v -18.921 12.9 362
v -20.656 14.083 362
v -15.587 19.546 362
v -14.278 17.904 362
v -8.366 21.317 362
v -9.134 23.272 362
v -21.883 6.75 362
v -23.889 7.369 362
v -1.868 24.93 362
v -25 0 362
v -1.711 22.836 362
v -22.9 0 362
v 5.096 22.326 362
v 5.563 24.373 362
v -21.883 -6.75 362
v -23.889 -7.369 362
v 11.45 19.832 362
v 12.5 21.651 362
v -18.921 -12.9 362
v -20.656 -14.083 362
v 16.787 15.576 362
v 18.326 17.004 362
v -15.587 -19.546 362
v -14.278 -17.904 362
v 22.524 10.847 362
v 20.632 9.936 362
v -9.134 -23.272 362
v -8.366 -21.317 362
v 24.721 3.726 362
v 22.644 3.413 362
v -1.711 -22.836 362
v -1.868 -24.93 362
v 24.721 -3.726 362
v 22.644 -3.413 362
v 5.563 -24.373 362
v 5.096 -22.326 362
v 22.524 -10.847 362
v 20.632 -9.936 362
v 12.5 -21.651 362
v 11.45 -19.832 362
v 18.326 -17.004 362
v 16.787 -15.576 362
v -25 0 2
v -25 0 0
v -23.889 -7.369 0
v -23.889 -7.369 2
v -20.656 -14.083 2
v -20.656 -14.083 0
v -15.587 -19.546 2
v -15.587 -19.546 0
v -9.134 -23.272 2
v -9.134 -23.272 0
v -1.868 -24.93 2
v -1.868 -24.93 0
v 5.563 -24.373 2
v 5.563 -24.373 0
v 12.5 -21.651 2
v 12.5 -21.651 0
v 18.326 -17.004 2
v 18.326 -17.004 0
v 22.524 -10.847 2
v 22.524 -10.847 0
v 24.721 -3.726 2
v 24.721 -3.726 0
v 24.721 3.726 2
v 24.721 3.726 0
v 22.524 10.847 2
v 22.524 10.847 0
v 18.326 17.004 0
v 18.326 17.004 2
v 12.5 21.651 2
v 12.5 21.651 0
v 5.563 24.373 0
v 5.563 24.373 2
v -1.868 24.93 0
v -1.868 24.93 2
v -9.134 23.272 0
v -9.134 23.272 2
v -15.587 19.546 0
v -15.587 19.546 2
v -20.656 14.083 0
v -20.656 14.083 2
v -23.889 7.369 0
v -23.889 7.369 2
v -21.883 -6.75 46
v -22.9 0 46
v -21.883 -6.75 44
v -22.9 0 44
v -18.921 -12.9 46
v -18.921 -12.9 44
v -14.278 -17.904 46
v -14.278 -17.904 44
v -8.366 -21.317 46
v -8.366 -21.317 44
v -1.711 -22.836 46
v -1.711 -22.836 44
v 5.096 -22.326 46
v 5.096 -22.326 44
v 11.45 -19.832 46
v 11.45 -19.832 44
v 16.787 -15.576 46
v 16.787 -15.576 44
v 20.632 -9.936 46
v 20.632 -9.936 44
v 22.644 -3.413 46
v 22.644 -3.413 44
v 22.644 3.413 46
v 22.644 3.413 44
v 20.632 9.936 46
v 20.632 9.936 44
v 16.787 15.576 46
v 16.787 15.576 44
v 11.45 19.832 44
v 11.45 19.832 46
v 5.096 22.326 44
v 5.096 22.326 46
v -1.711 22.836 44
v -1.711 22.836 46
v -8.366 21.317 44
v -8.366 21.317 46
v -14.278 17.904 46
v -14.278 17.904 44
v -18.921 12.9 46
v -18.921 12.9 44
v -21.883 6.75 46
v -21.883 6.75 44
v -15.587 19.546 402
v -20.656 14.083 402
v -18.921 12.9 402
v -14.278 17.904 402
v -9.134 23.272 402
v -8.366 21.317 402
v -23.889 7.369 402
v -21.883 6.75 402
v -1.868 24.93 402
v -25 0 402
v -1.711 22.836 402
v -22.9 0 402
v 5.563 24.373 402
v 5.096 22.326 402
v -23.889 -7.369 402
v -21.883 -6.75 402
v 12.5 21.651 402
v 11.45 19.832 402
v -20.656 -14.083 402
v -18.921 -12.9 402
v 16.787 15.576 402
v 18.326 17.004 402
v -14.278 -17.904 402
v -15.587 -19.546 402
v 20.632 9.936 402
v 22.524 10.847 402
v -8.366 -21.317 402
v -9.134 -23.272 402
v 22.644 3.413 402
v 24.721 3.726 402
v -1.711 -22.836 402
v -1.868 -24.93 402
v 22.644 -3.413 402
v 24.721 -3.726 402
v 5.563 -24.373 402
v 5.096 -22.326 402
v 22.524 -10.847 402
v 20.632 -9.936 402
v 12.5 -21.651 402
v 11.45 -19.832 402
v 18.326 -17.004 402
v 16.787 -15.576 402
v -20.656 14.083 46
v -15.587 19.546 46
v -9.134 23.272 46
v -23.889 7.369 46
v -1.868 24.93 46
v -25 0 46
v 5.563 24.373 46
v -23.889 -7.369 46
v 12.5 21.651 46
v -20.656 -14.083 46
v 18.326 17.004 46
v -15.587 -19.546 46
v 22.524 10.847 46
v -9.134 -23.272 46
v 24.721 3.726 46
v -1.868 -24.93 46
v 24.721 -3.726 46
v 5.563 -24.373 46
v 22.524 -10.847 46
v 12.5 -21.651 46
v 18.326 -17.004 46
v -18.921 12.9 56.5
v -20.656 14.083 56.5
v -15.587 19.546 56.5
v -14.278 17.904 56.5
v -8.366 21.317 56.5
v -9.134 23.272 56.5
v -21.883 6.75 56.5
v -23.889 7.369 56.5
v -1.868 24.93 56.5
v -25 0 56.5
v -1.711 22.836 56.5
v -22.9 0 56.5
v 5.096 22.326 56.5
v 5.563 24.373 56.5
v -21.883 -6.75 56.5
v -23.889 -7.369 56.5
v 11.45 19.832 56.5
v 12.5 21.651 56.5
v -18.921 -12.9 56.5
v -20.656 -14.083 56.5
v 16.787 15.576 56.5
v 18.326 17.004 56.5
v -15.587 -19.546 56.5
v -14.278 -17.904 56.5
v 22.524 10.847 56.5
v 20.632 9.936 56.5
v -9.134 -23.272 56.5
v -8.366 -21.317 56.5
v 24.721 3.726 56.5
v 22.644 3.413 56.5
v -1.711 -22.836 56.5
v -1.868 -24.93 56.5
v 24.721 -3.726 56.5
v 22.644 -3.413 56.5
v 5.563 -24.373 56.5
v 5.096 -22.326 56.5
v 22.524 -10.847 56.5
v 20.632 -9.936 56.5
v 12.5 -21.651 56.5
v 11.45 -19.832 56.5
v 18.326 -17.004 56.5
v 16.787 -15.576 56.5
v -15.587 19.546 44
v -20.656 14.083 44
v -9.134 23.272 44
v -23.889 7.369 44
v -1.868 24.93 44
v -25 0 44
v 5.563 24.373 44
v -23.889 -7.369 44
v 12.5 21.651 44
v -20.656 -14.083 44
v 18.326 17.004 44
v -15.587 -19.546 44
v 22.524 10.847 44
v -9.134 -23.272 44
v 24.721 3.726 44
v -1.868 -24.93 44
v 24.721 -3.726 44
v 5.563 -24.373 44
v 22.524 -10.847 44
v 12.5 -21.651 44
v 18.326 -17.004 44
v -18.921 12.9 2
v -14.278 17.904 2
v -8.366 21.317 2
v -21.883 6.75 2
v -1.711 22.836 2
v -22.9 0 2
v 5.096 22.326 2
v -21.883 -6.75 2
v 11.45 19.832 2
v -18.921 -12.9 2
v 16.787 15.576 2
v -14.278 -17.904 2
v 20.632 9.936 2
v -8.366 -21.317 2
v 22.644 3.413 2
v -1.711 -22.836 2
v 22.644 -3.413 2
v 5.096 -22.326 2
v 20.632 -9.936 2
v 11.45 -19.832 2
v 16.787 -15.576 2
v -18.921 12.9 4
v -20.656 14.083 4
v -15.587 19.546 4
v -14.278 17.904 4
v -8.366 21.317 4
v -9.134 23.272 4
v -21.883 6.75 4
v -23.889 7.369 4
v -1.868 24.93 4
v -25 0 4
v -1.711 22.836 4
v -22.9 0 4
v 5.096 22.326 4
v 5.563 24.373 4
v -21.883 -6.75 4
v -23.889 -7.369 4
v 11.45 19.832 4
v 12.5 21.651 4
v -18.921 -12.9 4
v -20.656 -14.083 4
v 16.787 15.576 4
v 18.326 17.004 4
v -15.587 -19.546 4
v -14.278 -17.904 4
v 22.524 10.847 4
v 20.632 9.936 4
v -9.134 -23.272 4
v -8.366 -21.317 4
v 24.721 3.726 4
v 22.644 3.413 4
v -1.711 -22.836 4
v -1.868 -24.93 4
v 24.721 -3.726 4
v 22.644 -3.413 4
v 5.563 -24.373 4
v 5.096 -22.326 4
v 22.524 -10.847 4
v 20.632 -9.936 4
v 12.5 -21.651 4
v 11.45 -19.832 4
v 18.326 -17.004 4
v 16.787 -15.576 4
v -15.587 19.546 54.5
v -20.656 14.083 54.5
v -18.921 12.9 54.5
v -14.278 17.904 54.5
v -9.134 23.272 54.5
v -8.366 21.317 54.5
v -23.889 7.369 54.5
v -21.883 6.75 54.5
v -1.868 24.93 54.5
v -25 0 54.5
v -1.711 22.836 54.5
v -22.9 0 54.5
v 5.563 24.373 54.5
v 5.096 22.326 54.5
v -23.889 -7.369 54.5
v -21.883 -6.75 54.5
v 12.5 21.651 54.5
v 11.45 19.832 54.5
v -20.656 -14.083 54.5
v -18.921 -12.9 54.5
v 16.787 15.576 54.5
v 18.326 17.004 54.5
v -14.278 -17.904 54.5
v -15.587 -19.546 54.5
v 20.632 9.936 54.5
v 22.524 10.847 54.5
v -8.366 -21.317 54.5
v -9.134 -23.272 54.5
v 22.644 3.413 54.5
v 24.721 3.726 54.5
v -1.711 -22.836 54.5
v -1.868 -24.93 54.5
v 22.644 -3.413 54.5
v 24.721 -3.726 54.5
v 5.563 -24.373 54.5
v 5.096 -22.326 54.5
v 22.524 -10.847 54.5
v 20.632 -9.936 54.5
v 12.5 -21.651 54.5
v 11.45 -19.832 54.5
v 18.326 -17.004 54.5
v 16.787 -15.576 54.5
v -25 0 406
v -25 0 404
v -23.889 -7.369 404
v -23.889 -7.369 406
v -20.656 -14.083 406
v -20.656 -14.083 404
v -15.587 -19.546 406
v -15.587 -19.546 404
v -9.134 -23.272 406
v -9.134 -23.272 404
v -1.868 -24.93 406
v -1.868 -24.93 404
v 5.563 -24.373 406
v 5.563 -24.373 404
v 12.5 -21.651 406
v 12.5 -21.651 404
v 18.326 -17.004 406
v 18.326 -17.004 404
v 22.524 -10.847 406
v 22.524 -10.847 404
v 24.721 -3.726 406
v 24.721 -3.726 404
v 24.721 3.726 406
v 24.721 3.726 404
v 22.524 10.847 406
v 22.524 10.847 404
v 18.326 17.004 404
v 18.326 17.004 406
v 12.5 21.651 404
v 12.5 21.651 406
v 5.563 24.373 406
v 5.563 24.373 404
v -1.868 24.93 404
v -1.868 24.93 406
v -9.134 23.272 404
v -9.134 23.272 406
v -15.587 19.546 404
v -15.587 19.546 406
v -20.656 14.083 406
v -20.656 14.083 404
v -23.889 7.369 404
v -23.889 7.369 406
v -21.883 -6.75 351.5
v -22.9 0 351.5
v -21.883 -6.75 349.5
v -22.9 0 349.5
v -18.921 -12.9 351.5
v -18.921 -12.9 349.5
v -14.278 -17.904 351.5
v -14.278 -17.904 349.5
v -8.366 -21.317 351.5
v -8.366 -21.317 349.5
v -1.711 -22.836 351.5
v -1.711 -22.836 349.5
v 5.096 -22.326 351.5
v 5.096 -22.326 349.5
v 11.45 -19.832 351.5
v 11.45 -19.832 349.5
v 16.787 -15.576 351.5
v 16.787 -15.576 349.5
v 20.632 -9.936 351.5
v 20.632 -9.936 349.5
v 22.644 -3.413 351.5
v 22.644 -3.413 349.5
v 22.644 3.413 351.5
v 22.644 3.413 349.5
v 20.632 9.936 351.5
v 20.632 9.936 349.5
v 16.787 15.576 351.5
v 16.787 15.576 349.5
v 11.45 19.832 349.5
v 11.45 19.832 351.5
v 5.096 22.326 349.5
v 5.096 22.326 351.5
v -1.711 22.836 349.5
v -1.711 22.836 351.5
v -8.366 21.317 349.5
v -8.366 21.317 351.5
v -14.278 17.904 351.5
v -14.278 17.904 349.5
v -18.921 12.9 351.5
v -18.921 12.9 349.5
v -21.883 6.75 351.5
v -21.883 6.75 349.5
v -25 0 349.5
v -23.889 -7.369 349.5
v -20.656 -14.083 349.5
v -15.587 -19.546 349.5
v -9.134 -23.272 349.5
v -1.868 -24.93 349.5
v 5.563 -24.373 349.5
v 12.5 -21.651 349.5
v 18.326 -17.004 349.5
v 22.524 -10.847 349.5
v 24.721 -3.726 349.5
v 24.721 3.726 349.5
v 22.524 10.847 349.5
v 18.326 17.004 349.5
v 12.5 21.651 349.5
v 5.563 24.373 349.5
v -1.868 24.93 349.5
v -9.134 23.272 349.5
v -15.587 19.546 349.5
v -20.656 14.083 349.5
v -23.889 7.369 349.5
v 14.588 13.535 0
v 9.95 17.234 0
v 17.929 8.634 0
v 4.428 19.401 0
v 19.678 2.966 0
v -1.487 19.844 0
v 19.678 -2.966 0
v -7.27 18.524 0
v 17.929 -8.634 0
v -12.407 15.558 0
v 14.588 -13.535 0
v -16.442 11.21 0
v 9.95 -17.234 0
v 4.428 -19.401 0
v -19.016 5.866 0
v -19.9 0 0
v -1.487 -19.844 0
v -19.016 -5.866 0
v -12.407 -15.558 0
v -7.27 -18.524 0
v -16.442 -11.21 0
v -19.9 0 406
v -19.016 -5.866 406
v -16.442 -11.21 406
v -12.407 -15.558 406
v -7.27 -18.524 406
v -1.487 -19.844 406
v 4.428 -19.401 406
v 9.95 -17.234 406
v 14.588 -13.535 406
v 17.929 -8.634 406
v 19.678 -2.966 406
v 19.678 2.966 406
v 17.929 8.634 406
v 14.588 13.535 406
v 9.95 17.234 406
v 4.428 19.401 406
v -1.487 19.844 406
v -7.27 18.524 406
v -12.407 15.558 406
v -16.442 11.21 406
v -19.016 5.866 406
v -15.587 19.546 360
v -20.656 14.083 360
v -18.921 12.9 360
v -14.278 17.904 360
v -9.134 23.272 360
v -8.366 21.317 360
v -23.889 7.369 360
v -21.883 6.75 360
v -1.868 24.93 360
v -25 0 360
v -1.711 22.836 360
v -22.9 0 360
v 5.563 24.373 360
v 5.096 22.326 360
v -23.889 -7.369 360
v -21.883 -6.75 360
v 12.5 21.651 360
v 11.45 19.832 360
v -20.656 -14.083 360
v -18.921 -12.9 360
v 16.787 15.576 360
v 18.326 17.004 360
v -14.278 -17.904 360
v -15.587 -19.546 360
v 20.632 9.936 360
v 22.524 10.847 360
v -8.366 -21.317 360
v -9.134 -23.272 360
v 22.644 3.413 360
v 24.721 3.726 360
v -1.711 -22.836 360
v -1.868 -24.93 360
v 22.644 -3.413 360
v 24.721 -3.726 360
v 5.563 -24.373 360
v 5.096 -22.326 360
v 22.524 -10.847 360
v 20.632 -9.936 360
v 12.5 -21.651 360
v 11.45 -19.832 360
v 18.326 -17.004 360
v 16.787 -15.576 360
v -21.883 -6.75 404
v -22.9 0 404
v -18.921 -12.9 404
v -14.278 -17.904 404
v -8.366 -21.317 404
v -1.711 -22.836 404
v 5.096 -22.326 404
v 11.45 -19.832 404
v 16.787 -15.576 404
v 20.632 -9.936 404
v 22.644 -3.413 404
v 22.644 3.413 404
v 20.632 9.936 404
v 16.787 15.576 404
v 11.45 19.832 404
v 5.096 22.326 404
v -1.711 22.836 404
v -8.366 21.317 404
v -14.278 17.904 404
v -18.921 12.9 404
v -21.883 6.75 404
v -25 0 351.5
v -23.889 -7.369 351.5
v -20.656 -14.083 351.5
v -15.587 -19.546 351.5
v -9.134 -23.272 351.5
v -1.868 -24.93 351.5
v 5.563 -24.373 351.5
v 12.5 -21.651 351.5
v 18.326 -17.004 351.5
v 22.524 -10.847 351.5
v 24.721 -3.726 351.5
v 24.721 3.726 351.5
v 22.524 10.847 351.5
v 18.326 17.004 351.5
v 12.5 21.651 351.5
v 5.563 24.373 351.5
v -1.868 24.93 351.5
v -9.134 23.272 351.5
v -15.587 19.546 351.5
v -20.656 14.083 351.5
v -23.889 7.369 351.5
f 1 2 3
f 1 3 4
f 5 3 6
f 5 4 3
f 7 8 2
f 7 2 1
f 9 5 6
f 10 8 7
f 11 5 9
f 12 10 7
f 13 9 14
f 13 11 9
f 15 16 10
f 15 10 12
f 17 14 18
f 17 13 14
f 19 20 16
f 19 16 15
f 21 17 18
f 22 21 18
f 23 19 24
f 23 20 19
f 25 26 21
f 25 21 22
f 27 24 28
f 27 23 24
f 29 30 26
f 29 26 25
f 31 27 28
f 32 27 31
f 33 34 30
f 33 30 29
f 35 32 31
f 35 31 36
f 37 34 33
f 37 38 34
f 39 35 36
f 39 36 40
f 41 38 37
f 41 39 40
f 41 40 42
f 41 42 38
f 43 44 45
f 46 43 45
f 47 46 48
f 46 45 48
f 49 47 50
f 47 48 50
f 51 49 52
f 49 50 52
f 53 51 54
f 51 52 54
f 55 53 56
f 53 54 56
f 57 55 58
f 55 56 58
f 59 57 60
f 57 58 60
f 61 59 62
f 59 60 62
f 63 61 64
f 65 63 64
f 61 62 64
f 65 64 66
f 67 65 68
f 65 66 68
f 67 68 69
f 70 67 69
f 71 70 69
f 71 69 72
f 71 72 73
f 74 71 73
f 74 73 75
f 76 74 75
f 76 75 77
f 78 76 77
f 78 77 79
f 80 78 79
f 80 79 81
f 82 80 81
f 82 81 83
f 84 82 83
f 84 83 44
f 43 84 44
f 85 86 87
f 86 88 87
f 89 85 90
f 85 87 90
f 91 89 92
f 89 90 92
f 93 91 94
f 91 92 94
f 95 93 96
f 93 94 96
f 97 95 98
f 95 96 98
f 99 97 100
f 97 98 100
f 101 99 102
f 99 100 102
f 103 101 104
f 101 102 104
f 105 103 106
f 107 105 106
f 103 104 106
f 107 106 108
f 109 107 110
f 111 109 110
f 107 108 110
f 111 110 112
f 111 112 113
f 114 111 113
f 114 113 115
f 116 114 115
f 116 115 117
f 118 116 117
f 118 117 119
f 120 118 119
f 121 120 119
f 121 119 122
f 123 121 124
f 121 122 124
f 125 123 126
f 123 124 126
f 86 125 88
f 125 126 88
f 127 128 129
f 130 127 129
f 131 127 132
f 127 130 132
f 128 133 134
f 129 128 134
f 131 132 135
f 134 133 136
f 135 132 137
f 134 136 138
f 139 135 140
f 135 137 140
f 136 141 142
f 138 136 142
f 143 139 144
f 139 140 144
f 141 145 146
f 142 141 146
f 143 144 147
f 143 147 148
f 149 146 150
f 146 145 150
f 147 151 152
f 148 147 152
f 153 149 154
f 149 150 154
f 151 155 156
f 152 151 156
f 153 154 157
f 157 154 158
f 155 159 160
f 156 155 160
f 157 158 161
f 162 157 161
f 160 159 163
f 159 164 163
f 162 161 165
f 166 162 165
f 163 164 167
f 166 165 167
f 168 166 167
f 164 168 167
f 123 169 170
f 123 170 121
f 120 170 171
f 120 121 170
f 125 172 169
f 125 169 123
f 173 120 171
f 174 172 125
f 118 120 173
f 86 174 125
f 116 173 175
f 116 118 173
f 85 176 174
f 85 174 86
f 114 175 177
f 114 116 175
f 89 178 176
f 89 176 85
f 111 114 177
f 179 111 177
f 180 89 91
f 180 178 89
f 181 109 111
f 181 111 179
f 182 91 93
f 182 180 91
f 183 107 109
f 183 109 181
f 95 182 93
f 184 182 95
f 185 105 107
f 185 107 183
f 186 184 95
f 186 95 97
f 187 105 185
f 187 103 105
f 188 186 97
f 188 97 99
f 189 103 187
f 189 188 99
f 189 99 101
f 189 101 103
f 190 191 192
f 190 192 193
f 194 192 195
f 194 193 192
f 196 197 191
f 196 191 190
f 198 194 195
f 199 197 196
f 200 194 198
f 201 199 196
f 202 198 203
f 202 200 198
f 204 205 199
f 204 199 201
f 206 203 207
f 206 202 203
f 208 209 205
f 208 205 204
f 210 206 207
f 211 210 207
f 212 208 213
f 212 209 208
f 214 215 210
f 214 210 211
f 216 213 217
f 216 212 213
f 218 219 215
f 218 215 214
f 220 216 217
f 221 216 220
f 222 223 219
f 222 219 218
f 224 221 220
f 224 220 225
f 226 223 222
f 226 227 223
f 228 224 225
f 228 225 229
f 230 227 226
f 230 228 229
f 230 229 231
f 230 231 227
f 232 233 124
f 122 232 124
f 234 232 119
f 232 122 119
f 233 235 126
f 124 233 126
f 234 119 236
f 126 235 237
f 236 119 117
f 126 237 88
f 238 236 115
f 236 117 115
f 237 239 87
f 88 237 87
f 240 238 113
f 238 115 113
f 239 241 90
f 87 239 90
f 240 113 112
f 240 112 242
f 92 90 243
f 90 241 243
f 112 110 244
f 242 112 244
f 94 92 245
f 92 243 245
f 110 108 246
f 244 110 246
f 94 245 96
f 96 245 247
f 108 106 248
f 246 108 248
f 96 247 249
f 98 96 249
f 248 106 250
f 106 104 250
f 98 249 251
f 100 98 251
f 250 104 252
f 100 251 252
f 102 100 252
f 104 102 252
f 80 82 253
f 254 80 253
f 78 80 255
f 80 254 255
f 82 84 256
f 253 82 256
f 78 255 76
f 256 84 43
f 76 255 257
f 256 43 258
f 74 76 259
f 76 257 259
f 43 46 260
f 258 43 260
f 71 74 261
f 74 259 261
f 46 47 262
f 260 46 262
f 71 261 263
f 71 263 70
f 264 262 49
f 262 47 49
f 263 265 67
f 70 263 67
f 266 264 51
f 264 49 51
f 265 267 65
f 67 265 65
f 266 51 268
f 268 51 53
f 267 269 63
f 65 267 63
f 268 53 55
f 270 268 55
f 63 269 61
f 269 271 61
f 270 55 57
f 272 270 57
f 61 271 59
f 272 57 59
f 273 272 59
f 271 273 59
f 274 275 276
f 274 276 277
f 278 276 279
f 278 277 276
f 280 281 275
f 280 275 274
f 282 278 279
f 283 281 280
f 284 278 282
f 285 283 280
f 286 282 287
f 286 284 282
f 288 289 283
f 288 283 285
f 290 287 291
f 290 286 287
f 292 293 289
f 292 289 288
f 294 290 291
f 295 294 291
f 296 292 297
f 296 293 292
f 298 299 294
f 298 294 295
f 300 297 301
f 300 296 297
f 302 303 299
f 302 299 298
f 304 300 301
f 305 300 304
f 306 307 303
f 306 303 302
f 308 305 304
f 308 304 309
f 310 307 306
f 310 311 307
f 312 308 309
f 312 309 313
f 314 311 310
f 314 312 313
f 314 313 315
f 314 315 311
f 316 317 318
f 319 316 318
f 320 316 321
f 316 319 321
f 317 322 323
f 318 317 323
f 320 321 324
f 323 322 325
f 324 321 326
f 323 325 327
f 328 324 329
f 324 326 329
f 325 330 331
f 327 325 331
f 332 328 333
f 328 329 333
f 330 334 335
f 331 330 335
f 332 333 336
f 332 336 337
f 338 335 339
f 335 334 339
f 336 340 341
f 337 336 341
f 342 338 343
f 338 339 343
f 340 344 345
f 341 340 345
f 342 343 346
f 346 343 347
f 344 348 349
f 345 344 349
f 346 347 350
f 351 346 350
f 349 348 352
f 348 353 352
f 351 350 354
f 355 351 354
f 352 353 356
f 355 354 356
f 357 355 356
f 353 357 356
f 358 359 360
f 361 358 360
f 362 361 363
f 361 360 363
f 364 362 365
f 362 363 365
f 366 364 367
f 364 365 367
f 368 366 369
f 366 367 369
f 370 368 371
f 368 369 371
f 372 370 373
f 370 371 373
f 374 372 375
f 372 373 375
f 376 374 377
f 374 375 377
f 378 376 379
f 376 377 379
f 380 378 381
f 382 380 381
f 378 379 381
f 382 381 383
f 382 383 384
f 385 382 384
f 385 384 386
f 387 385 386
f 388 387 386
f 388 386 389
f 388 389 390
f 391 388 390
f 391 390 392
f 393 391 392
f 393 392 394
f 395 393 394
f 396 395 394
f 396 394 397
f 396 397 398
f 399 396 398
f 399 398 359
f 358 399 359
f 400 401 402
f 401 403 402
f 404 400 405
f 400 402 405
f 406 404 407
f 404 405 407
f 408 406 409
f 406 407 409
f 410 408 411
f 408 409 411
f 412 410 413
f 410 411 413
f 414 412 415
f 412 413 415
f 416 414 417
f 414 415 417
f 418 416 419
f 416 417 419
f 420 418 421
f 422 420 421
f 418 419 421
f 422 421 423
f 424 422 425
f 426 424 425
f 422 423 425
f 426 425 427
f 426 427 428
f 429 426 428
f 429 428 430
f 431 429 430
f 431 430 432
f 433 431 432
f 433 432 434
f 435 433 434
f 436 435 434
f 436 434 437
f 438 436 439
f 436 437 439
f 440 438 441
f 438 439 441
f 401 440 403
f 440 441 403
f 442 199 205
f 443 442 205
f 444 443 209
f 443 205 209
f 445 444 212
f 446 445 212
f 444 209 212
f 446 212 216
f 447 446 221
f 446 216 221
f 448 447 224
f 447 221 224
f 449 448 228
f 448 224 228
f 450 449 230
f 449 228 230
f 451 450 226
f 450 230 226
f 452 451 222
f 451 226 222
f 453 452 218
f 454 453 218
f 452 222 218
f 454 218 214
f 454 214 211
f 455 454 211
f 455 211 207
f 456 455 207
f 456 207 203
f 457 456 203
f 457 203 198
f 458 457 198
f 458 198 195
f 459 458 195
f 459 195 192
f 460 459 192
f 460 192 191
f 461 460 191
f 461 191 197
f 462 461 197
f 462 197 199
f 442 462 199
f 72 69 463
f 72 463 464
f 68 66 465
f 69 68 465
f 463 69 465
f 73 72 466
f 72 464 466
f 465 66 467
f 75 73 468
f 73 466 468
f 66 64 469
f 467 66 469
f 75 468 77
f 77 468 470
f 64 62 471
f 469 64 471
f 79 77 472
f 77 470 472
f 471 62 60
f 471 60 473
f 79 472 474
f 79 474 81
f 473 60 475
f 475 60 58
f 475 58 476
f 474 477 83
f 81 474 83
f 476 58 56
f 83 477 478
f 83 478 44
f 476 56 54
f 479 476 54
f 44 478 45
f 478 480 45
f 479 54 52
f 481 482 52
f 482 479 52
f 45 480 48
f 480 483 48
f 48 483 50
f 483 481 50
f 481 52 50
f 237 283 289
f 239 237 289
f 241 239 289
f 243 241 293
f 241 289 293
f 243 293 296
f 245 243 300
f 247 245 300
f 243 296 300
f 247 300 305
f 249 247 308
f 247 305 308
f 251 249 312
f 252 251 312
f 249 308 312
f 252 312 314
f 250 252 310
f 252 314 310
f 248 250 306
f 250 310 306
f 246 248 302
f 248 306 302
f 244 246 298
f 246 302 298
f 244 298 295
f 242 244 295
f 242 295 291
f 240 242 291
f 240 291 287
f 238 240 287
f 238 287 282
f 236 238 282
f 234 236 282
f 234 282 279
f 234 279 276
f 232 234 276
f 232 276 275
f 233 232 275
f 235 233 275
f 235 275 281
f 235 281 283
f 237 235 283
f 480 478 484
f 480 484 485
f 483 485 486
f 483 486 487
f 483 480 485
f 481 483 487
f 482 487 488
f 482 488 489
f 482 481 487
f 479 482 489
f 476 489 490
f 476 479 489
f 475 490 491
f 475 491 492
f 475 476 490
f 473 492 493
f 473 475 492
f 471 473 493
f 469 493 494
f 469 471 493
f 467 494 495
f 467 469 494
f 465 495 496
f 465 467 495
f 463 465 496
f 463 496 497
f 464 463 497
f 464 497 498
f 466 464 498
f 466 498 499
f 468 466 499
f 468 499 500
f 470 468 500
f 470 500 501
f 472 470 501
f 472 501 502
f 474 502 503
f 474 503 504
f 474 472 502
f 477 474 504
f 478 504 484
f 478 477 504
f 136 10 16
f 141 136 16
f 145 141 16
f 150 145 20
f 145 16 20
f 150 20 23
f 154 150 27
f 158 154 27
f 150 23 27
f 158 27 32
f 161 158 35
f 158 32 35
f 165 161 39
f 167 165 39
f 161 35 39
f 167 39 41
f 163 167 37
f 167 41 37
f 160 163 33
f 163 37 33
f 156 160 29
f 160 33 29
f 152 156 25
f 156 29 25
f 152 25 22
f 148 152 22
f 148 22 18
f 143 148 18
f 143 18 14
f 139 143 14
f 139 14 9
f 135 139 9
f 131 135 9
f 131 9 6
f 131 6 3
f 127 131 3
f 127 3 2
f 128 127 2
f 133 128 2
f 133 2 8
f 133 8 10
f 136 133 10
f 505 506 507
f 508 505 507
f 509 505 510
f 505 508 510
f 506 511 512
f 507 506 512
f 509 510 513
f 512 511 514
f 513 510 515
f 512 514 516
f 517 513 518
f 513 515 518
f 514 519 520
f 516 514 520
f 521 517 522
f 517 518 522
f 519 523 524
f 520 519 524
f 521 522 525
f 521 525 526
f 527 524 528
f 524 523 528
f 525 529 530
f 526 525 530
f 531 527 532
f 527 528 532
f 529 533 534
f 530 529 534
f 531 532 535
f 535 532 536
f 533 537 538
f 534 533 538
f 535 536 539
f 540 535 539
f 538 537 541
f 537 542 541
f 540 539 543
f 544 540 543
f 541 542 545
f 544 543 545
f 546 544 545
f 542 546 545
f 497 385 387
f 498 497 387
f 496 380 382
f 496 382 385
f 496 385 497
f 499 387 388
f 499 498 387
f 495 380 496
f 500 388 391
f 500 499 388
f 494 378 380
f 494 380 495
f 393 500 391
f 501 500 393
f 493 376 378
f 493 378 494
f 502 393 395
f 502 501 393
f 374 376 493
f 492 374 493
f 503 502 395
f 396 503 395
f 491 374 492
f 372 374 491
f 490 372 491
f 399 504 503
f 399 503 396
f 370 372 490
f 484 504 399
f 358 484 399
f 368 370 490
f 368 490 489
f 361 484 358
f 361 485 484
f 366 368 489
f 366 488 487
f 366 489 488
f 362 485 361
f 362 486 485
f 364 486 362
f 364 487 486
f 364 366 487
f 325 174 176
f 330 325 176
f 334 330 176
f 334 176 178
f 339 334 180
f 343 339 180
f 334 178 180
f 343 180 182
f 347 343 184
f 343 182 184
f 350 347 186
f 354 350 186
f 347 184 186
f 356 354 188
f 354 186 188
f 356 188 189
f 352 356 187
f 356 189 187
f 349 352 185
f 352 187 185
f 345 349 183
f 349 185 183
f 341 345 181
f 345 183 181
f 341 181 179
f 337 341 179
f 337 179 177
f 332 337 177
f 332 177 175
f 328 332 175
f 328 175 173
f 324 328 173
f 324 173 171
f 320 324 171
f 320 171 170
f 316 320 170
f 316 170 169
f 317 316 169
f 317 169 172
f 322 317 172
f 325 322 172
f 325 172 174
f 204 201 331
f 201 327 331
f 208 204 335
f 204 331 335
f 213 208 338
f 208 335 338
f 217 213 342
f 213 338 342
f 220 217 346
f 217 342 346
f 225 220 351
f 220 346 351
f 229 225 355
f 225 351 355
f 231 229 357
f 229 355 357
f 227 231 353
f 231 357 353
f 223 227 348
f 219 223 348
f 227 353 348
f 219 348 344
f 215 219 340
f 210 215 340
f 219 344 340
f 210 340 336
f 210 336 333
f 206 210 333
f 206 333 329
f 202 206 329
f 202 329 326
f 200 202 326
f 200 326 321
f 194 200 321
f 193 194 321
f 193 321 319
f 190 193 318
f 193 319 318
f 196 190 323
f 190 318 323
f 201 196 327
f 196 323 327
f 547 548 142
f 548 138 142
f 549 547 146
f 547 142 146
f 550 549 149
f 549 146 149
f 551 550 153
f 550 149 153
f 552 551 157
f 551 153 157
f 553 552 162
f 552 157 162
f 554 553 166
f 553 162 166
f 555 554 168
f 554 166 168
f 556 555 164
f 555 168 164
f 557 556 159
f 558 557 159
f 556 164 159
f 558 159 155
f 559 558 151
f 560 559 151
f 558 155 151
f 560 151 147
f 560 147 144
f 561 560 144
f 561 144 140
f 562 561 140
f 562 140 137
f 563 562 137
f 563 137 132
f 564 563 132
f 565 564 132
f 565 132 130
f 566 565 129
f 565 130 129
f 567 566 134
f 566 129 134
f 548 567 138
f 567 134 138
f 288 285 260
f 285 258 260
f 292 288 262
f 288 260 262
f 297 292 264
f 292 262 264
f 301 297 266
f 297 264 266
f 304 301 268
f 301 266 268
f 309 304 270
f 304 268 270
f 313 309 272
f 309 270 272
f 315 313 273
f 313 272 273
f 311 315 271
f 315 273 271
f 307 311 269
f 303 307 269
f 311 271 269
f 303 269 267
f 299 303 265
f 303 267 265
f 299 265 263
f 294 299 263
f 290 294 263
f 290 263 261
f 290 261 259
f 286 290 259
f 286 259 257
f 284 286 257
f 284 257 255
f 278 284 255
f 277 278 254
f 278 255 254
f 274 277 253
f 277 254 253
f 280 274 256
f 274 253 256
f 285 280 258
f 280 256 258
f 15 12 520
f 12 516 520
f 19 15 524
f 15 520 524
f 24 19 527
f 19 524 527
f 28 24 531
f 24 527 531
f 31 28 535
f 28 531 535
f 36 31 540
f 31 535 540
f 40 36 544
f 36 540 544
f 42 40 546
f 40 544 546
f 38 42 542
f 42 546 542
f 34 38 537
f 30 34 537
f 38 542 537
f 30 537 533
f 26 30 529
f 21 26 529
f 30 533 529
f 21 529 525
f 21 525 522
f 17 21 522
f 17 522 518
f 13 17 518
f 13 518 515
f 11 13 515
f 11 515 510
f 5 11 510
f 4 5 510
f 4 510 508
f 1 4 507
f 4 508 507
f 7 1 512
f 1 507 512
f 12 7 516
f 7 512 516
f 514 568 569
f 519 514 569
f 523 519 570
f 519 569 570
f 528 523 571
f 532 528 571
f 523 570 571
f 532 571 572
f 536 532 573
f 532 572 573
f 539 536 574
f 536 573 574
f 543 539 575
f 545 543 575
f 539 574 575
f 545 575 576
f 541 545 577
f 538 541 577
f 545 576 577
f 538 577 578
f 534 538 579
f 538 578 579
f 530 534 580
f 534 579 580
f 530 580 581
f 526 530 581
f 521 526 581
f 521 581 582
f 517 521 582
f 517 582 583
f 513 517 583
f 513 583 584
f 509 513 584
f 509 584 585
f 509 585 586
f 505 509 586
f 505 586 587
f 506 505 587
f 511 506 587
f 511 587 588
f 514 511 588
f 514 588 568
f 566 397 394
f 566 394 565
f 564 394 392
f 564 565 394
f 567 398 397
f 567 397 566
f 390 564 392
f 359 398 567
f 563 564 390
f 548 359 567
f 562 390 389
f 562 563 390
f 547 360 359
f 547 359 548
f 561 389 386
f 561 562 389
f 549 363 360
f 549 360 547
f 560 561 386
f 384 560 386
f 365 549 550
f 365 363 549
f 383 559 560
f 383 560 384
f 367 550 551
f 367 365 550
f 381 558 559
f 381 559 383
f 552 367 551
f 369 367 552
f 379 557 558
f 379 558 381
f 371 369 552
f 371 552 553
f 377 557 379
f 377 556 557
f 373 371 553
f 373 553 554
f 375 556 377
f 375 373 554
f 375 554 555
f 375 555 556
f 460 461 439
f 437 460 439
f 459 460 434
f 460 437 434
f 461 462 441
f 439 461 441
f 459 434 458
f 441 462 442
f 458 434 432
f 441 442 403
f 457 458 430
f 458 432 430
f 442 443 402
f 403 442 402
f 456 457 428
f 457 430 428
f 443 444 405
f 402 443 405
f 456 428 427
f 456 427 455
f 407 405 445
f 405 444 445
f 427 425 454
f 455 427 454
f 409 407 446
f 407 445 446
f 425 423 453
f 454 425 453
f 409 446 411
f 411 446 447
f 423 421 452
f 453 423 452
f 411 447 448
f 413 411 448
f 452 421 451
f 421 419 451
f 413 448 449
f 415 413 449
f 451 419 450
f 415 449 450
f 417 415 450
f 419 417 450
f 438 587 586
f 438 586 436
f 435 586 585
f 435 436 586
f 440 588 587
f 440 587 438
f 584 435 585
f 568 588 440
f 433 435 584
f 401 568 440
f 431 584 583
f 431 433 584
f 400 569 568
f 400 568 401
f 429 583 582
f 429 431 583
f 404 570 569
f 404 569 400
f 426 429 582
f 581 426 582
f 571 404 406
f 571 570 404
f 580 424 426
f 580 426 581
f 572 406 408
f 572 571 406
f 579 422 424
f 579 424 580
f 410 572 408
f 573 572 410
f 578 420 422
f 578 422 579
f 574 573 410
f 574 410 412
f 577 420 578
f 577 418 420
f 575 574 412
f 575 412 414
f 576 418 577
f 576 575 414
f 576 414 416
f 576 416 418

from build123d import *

# Parameters (mm, degrees)
SKETCH1_R   = 25
SKETCH1_R_2 = 19.9
BODY_DEPTH  = 406
SKETCH2_W   = 2
SKETCH2_H   = 2.1


with BuildPart() as part:
    # Sketch1 → Body (new body)
    with BuildSketch(Plane.XY):
        with Locations(Location((0, 0, 0), (0, 0, 180))):
            Circle(SKETCH1_R)
        with Locations(Location((0, 0, 0), (0, 0, 180))):
            Circle(SKETCH1_R_2, mode=Mode.SUBTRACT)
    extrude(amount=BODY_DEPTH)

    # Sketch2 → Ret Ring Grooves (revolve, cut)
    with BuildSketch(Plane(origin=(0, 0, 0), x_dir=(0, 0, -1), z_dir=(1, 0, 0)), mode=Mode.PRIVATE) as ret_ring_grooves_sk:
        with Locations((-403, 23.95)):
            Rectangle(SKETCH2_W, SKETCH2_H)
        with Locations((-361, 23.95)):
            Rectangle(SKETCH2_W, SKETCH2_H)
        with Locations((-55.5, 23.95)):
            Rectangle(SKETCH2_W, SKETCH2_H)
        with Locations((-350.5, 23.95)):
            Rectangle(SKETCH2_W, SKETCH2_H)
        with Locations((-45, 23.95)):
            Rectangle(SKETCH2_W, SKETCH2_H)
        with Locations((-3, 23.95)):
            Rectangle(SKETCH2_W, SKETCH2_H)
    revolve(ret_ring_grooves_sk.sketch.rotate(Axis((0, 0, 0), (0, 0, 1)), 90), axis=Axis((0, 0, 0), (0, 0, 1)), mode=Mode.SUBTRACT)


solid = part.part
